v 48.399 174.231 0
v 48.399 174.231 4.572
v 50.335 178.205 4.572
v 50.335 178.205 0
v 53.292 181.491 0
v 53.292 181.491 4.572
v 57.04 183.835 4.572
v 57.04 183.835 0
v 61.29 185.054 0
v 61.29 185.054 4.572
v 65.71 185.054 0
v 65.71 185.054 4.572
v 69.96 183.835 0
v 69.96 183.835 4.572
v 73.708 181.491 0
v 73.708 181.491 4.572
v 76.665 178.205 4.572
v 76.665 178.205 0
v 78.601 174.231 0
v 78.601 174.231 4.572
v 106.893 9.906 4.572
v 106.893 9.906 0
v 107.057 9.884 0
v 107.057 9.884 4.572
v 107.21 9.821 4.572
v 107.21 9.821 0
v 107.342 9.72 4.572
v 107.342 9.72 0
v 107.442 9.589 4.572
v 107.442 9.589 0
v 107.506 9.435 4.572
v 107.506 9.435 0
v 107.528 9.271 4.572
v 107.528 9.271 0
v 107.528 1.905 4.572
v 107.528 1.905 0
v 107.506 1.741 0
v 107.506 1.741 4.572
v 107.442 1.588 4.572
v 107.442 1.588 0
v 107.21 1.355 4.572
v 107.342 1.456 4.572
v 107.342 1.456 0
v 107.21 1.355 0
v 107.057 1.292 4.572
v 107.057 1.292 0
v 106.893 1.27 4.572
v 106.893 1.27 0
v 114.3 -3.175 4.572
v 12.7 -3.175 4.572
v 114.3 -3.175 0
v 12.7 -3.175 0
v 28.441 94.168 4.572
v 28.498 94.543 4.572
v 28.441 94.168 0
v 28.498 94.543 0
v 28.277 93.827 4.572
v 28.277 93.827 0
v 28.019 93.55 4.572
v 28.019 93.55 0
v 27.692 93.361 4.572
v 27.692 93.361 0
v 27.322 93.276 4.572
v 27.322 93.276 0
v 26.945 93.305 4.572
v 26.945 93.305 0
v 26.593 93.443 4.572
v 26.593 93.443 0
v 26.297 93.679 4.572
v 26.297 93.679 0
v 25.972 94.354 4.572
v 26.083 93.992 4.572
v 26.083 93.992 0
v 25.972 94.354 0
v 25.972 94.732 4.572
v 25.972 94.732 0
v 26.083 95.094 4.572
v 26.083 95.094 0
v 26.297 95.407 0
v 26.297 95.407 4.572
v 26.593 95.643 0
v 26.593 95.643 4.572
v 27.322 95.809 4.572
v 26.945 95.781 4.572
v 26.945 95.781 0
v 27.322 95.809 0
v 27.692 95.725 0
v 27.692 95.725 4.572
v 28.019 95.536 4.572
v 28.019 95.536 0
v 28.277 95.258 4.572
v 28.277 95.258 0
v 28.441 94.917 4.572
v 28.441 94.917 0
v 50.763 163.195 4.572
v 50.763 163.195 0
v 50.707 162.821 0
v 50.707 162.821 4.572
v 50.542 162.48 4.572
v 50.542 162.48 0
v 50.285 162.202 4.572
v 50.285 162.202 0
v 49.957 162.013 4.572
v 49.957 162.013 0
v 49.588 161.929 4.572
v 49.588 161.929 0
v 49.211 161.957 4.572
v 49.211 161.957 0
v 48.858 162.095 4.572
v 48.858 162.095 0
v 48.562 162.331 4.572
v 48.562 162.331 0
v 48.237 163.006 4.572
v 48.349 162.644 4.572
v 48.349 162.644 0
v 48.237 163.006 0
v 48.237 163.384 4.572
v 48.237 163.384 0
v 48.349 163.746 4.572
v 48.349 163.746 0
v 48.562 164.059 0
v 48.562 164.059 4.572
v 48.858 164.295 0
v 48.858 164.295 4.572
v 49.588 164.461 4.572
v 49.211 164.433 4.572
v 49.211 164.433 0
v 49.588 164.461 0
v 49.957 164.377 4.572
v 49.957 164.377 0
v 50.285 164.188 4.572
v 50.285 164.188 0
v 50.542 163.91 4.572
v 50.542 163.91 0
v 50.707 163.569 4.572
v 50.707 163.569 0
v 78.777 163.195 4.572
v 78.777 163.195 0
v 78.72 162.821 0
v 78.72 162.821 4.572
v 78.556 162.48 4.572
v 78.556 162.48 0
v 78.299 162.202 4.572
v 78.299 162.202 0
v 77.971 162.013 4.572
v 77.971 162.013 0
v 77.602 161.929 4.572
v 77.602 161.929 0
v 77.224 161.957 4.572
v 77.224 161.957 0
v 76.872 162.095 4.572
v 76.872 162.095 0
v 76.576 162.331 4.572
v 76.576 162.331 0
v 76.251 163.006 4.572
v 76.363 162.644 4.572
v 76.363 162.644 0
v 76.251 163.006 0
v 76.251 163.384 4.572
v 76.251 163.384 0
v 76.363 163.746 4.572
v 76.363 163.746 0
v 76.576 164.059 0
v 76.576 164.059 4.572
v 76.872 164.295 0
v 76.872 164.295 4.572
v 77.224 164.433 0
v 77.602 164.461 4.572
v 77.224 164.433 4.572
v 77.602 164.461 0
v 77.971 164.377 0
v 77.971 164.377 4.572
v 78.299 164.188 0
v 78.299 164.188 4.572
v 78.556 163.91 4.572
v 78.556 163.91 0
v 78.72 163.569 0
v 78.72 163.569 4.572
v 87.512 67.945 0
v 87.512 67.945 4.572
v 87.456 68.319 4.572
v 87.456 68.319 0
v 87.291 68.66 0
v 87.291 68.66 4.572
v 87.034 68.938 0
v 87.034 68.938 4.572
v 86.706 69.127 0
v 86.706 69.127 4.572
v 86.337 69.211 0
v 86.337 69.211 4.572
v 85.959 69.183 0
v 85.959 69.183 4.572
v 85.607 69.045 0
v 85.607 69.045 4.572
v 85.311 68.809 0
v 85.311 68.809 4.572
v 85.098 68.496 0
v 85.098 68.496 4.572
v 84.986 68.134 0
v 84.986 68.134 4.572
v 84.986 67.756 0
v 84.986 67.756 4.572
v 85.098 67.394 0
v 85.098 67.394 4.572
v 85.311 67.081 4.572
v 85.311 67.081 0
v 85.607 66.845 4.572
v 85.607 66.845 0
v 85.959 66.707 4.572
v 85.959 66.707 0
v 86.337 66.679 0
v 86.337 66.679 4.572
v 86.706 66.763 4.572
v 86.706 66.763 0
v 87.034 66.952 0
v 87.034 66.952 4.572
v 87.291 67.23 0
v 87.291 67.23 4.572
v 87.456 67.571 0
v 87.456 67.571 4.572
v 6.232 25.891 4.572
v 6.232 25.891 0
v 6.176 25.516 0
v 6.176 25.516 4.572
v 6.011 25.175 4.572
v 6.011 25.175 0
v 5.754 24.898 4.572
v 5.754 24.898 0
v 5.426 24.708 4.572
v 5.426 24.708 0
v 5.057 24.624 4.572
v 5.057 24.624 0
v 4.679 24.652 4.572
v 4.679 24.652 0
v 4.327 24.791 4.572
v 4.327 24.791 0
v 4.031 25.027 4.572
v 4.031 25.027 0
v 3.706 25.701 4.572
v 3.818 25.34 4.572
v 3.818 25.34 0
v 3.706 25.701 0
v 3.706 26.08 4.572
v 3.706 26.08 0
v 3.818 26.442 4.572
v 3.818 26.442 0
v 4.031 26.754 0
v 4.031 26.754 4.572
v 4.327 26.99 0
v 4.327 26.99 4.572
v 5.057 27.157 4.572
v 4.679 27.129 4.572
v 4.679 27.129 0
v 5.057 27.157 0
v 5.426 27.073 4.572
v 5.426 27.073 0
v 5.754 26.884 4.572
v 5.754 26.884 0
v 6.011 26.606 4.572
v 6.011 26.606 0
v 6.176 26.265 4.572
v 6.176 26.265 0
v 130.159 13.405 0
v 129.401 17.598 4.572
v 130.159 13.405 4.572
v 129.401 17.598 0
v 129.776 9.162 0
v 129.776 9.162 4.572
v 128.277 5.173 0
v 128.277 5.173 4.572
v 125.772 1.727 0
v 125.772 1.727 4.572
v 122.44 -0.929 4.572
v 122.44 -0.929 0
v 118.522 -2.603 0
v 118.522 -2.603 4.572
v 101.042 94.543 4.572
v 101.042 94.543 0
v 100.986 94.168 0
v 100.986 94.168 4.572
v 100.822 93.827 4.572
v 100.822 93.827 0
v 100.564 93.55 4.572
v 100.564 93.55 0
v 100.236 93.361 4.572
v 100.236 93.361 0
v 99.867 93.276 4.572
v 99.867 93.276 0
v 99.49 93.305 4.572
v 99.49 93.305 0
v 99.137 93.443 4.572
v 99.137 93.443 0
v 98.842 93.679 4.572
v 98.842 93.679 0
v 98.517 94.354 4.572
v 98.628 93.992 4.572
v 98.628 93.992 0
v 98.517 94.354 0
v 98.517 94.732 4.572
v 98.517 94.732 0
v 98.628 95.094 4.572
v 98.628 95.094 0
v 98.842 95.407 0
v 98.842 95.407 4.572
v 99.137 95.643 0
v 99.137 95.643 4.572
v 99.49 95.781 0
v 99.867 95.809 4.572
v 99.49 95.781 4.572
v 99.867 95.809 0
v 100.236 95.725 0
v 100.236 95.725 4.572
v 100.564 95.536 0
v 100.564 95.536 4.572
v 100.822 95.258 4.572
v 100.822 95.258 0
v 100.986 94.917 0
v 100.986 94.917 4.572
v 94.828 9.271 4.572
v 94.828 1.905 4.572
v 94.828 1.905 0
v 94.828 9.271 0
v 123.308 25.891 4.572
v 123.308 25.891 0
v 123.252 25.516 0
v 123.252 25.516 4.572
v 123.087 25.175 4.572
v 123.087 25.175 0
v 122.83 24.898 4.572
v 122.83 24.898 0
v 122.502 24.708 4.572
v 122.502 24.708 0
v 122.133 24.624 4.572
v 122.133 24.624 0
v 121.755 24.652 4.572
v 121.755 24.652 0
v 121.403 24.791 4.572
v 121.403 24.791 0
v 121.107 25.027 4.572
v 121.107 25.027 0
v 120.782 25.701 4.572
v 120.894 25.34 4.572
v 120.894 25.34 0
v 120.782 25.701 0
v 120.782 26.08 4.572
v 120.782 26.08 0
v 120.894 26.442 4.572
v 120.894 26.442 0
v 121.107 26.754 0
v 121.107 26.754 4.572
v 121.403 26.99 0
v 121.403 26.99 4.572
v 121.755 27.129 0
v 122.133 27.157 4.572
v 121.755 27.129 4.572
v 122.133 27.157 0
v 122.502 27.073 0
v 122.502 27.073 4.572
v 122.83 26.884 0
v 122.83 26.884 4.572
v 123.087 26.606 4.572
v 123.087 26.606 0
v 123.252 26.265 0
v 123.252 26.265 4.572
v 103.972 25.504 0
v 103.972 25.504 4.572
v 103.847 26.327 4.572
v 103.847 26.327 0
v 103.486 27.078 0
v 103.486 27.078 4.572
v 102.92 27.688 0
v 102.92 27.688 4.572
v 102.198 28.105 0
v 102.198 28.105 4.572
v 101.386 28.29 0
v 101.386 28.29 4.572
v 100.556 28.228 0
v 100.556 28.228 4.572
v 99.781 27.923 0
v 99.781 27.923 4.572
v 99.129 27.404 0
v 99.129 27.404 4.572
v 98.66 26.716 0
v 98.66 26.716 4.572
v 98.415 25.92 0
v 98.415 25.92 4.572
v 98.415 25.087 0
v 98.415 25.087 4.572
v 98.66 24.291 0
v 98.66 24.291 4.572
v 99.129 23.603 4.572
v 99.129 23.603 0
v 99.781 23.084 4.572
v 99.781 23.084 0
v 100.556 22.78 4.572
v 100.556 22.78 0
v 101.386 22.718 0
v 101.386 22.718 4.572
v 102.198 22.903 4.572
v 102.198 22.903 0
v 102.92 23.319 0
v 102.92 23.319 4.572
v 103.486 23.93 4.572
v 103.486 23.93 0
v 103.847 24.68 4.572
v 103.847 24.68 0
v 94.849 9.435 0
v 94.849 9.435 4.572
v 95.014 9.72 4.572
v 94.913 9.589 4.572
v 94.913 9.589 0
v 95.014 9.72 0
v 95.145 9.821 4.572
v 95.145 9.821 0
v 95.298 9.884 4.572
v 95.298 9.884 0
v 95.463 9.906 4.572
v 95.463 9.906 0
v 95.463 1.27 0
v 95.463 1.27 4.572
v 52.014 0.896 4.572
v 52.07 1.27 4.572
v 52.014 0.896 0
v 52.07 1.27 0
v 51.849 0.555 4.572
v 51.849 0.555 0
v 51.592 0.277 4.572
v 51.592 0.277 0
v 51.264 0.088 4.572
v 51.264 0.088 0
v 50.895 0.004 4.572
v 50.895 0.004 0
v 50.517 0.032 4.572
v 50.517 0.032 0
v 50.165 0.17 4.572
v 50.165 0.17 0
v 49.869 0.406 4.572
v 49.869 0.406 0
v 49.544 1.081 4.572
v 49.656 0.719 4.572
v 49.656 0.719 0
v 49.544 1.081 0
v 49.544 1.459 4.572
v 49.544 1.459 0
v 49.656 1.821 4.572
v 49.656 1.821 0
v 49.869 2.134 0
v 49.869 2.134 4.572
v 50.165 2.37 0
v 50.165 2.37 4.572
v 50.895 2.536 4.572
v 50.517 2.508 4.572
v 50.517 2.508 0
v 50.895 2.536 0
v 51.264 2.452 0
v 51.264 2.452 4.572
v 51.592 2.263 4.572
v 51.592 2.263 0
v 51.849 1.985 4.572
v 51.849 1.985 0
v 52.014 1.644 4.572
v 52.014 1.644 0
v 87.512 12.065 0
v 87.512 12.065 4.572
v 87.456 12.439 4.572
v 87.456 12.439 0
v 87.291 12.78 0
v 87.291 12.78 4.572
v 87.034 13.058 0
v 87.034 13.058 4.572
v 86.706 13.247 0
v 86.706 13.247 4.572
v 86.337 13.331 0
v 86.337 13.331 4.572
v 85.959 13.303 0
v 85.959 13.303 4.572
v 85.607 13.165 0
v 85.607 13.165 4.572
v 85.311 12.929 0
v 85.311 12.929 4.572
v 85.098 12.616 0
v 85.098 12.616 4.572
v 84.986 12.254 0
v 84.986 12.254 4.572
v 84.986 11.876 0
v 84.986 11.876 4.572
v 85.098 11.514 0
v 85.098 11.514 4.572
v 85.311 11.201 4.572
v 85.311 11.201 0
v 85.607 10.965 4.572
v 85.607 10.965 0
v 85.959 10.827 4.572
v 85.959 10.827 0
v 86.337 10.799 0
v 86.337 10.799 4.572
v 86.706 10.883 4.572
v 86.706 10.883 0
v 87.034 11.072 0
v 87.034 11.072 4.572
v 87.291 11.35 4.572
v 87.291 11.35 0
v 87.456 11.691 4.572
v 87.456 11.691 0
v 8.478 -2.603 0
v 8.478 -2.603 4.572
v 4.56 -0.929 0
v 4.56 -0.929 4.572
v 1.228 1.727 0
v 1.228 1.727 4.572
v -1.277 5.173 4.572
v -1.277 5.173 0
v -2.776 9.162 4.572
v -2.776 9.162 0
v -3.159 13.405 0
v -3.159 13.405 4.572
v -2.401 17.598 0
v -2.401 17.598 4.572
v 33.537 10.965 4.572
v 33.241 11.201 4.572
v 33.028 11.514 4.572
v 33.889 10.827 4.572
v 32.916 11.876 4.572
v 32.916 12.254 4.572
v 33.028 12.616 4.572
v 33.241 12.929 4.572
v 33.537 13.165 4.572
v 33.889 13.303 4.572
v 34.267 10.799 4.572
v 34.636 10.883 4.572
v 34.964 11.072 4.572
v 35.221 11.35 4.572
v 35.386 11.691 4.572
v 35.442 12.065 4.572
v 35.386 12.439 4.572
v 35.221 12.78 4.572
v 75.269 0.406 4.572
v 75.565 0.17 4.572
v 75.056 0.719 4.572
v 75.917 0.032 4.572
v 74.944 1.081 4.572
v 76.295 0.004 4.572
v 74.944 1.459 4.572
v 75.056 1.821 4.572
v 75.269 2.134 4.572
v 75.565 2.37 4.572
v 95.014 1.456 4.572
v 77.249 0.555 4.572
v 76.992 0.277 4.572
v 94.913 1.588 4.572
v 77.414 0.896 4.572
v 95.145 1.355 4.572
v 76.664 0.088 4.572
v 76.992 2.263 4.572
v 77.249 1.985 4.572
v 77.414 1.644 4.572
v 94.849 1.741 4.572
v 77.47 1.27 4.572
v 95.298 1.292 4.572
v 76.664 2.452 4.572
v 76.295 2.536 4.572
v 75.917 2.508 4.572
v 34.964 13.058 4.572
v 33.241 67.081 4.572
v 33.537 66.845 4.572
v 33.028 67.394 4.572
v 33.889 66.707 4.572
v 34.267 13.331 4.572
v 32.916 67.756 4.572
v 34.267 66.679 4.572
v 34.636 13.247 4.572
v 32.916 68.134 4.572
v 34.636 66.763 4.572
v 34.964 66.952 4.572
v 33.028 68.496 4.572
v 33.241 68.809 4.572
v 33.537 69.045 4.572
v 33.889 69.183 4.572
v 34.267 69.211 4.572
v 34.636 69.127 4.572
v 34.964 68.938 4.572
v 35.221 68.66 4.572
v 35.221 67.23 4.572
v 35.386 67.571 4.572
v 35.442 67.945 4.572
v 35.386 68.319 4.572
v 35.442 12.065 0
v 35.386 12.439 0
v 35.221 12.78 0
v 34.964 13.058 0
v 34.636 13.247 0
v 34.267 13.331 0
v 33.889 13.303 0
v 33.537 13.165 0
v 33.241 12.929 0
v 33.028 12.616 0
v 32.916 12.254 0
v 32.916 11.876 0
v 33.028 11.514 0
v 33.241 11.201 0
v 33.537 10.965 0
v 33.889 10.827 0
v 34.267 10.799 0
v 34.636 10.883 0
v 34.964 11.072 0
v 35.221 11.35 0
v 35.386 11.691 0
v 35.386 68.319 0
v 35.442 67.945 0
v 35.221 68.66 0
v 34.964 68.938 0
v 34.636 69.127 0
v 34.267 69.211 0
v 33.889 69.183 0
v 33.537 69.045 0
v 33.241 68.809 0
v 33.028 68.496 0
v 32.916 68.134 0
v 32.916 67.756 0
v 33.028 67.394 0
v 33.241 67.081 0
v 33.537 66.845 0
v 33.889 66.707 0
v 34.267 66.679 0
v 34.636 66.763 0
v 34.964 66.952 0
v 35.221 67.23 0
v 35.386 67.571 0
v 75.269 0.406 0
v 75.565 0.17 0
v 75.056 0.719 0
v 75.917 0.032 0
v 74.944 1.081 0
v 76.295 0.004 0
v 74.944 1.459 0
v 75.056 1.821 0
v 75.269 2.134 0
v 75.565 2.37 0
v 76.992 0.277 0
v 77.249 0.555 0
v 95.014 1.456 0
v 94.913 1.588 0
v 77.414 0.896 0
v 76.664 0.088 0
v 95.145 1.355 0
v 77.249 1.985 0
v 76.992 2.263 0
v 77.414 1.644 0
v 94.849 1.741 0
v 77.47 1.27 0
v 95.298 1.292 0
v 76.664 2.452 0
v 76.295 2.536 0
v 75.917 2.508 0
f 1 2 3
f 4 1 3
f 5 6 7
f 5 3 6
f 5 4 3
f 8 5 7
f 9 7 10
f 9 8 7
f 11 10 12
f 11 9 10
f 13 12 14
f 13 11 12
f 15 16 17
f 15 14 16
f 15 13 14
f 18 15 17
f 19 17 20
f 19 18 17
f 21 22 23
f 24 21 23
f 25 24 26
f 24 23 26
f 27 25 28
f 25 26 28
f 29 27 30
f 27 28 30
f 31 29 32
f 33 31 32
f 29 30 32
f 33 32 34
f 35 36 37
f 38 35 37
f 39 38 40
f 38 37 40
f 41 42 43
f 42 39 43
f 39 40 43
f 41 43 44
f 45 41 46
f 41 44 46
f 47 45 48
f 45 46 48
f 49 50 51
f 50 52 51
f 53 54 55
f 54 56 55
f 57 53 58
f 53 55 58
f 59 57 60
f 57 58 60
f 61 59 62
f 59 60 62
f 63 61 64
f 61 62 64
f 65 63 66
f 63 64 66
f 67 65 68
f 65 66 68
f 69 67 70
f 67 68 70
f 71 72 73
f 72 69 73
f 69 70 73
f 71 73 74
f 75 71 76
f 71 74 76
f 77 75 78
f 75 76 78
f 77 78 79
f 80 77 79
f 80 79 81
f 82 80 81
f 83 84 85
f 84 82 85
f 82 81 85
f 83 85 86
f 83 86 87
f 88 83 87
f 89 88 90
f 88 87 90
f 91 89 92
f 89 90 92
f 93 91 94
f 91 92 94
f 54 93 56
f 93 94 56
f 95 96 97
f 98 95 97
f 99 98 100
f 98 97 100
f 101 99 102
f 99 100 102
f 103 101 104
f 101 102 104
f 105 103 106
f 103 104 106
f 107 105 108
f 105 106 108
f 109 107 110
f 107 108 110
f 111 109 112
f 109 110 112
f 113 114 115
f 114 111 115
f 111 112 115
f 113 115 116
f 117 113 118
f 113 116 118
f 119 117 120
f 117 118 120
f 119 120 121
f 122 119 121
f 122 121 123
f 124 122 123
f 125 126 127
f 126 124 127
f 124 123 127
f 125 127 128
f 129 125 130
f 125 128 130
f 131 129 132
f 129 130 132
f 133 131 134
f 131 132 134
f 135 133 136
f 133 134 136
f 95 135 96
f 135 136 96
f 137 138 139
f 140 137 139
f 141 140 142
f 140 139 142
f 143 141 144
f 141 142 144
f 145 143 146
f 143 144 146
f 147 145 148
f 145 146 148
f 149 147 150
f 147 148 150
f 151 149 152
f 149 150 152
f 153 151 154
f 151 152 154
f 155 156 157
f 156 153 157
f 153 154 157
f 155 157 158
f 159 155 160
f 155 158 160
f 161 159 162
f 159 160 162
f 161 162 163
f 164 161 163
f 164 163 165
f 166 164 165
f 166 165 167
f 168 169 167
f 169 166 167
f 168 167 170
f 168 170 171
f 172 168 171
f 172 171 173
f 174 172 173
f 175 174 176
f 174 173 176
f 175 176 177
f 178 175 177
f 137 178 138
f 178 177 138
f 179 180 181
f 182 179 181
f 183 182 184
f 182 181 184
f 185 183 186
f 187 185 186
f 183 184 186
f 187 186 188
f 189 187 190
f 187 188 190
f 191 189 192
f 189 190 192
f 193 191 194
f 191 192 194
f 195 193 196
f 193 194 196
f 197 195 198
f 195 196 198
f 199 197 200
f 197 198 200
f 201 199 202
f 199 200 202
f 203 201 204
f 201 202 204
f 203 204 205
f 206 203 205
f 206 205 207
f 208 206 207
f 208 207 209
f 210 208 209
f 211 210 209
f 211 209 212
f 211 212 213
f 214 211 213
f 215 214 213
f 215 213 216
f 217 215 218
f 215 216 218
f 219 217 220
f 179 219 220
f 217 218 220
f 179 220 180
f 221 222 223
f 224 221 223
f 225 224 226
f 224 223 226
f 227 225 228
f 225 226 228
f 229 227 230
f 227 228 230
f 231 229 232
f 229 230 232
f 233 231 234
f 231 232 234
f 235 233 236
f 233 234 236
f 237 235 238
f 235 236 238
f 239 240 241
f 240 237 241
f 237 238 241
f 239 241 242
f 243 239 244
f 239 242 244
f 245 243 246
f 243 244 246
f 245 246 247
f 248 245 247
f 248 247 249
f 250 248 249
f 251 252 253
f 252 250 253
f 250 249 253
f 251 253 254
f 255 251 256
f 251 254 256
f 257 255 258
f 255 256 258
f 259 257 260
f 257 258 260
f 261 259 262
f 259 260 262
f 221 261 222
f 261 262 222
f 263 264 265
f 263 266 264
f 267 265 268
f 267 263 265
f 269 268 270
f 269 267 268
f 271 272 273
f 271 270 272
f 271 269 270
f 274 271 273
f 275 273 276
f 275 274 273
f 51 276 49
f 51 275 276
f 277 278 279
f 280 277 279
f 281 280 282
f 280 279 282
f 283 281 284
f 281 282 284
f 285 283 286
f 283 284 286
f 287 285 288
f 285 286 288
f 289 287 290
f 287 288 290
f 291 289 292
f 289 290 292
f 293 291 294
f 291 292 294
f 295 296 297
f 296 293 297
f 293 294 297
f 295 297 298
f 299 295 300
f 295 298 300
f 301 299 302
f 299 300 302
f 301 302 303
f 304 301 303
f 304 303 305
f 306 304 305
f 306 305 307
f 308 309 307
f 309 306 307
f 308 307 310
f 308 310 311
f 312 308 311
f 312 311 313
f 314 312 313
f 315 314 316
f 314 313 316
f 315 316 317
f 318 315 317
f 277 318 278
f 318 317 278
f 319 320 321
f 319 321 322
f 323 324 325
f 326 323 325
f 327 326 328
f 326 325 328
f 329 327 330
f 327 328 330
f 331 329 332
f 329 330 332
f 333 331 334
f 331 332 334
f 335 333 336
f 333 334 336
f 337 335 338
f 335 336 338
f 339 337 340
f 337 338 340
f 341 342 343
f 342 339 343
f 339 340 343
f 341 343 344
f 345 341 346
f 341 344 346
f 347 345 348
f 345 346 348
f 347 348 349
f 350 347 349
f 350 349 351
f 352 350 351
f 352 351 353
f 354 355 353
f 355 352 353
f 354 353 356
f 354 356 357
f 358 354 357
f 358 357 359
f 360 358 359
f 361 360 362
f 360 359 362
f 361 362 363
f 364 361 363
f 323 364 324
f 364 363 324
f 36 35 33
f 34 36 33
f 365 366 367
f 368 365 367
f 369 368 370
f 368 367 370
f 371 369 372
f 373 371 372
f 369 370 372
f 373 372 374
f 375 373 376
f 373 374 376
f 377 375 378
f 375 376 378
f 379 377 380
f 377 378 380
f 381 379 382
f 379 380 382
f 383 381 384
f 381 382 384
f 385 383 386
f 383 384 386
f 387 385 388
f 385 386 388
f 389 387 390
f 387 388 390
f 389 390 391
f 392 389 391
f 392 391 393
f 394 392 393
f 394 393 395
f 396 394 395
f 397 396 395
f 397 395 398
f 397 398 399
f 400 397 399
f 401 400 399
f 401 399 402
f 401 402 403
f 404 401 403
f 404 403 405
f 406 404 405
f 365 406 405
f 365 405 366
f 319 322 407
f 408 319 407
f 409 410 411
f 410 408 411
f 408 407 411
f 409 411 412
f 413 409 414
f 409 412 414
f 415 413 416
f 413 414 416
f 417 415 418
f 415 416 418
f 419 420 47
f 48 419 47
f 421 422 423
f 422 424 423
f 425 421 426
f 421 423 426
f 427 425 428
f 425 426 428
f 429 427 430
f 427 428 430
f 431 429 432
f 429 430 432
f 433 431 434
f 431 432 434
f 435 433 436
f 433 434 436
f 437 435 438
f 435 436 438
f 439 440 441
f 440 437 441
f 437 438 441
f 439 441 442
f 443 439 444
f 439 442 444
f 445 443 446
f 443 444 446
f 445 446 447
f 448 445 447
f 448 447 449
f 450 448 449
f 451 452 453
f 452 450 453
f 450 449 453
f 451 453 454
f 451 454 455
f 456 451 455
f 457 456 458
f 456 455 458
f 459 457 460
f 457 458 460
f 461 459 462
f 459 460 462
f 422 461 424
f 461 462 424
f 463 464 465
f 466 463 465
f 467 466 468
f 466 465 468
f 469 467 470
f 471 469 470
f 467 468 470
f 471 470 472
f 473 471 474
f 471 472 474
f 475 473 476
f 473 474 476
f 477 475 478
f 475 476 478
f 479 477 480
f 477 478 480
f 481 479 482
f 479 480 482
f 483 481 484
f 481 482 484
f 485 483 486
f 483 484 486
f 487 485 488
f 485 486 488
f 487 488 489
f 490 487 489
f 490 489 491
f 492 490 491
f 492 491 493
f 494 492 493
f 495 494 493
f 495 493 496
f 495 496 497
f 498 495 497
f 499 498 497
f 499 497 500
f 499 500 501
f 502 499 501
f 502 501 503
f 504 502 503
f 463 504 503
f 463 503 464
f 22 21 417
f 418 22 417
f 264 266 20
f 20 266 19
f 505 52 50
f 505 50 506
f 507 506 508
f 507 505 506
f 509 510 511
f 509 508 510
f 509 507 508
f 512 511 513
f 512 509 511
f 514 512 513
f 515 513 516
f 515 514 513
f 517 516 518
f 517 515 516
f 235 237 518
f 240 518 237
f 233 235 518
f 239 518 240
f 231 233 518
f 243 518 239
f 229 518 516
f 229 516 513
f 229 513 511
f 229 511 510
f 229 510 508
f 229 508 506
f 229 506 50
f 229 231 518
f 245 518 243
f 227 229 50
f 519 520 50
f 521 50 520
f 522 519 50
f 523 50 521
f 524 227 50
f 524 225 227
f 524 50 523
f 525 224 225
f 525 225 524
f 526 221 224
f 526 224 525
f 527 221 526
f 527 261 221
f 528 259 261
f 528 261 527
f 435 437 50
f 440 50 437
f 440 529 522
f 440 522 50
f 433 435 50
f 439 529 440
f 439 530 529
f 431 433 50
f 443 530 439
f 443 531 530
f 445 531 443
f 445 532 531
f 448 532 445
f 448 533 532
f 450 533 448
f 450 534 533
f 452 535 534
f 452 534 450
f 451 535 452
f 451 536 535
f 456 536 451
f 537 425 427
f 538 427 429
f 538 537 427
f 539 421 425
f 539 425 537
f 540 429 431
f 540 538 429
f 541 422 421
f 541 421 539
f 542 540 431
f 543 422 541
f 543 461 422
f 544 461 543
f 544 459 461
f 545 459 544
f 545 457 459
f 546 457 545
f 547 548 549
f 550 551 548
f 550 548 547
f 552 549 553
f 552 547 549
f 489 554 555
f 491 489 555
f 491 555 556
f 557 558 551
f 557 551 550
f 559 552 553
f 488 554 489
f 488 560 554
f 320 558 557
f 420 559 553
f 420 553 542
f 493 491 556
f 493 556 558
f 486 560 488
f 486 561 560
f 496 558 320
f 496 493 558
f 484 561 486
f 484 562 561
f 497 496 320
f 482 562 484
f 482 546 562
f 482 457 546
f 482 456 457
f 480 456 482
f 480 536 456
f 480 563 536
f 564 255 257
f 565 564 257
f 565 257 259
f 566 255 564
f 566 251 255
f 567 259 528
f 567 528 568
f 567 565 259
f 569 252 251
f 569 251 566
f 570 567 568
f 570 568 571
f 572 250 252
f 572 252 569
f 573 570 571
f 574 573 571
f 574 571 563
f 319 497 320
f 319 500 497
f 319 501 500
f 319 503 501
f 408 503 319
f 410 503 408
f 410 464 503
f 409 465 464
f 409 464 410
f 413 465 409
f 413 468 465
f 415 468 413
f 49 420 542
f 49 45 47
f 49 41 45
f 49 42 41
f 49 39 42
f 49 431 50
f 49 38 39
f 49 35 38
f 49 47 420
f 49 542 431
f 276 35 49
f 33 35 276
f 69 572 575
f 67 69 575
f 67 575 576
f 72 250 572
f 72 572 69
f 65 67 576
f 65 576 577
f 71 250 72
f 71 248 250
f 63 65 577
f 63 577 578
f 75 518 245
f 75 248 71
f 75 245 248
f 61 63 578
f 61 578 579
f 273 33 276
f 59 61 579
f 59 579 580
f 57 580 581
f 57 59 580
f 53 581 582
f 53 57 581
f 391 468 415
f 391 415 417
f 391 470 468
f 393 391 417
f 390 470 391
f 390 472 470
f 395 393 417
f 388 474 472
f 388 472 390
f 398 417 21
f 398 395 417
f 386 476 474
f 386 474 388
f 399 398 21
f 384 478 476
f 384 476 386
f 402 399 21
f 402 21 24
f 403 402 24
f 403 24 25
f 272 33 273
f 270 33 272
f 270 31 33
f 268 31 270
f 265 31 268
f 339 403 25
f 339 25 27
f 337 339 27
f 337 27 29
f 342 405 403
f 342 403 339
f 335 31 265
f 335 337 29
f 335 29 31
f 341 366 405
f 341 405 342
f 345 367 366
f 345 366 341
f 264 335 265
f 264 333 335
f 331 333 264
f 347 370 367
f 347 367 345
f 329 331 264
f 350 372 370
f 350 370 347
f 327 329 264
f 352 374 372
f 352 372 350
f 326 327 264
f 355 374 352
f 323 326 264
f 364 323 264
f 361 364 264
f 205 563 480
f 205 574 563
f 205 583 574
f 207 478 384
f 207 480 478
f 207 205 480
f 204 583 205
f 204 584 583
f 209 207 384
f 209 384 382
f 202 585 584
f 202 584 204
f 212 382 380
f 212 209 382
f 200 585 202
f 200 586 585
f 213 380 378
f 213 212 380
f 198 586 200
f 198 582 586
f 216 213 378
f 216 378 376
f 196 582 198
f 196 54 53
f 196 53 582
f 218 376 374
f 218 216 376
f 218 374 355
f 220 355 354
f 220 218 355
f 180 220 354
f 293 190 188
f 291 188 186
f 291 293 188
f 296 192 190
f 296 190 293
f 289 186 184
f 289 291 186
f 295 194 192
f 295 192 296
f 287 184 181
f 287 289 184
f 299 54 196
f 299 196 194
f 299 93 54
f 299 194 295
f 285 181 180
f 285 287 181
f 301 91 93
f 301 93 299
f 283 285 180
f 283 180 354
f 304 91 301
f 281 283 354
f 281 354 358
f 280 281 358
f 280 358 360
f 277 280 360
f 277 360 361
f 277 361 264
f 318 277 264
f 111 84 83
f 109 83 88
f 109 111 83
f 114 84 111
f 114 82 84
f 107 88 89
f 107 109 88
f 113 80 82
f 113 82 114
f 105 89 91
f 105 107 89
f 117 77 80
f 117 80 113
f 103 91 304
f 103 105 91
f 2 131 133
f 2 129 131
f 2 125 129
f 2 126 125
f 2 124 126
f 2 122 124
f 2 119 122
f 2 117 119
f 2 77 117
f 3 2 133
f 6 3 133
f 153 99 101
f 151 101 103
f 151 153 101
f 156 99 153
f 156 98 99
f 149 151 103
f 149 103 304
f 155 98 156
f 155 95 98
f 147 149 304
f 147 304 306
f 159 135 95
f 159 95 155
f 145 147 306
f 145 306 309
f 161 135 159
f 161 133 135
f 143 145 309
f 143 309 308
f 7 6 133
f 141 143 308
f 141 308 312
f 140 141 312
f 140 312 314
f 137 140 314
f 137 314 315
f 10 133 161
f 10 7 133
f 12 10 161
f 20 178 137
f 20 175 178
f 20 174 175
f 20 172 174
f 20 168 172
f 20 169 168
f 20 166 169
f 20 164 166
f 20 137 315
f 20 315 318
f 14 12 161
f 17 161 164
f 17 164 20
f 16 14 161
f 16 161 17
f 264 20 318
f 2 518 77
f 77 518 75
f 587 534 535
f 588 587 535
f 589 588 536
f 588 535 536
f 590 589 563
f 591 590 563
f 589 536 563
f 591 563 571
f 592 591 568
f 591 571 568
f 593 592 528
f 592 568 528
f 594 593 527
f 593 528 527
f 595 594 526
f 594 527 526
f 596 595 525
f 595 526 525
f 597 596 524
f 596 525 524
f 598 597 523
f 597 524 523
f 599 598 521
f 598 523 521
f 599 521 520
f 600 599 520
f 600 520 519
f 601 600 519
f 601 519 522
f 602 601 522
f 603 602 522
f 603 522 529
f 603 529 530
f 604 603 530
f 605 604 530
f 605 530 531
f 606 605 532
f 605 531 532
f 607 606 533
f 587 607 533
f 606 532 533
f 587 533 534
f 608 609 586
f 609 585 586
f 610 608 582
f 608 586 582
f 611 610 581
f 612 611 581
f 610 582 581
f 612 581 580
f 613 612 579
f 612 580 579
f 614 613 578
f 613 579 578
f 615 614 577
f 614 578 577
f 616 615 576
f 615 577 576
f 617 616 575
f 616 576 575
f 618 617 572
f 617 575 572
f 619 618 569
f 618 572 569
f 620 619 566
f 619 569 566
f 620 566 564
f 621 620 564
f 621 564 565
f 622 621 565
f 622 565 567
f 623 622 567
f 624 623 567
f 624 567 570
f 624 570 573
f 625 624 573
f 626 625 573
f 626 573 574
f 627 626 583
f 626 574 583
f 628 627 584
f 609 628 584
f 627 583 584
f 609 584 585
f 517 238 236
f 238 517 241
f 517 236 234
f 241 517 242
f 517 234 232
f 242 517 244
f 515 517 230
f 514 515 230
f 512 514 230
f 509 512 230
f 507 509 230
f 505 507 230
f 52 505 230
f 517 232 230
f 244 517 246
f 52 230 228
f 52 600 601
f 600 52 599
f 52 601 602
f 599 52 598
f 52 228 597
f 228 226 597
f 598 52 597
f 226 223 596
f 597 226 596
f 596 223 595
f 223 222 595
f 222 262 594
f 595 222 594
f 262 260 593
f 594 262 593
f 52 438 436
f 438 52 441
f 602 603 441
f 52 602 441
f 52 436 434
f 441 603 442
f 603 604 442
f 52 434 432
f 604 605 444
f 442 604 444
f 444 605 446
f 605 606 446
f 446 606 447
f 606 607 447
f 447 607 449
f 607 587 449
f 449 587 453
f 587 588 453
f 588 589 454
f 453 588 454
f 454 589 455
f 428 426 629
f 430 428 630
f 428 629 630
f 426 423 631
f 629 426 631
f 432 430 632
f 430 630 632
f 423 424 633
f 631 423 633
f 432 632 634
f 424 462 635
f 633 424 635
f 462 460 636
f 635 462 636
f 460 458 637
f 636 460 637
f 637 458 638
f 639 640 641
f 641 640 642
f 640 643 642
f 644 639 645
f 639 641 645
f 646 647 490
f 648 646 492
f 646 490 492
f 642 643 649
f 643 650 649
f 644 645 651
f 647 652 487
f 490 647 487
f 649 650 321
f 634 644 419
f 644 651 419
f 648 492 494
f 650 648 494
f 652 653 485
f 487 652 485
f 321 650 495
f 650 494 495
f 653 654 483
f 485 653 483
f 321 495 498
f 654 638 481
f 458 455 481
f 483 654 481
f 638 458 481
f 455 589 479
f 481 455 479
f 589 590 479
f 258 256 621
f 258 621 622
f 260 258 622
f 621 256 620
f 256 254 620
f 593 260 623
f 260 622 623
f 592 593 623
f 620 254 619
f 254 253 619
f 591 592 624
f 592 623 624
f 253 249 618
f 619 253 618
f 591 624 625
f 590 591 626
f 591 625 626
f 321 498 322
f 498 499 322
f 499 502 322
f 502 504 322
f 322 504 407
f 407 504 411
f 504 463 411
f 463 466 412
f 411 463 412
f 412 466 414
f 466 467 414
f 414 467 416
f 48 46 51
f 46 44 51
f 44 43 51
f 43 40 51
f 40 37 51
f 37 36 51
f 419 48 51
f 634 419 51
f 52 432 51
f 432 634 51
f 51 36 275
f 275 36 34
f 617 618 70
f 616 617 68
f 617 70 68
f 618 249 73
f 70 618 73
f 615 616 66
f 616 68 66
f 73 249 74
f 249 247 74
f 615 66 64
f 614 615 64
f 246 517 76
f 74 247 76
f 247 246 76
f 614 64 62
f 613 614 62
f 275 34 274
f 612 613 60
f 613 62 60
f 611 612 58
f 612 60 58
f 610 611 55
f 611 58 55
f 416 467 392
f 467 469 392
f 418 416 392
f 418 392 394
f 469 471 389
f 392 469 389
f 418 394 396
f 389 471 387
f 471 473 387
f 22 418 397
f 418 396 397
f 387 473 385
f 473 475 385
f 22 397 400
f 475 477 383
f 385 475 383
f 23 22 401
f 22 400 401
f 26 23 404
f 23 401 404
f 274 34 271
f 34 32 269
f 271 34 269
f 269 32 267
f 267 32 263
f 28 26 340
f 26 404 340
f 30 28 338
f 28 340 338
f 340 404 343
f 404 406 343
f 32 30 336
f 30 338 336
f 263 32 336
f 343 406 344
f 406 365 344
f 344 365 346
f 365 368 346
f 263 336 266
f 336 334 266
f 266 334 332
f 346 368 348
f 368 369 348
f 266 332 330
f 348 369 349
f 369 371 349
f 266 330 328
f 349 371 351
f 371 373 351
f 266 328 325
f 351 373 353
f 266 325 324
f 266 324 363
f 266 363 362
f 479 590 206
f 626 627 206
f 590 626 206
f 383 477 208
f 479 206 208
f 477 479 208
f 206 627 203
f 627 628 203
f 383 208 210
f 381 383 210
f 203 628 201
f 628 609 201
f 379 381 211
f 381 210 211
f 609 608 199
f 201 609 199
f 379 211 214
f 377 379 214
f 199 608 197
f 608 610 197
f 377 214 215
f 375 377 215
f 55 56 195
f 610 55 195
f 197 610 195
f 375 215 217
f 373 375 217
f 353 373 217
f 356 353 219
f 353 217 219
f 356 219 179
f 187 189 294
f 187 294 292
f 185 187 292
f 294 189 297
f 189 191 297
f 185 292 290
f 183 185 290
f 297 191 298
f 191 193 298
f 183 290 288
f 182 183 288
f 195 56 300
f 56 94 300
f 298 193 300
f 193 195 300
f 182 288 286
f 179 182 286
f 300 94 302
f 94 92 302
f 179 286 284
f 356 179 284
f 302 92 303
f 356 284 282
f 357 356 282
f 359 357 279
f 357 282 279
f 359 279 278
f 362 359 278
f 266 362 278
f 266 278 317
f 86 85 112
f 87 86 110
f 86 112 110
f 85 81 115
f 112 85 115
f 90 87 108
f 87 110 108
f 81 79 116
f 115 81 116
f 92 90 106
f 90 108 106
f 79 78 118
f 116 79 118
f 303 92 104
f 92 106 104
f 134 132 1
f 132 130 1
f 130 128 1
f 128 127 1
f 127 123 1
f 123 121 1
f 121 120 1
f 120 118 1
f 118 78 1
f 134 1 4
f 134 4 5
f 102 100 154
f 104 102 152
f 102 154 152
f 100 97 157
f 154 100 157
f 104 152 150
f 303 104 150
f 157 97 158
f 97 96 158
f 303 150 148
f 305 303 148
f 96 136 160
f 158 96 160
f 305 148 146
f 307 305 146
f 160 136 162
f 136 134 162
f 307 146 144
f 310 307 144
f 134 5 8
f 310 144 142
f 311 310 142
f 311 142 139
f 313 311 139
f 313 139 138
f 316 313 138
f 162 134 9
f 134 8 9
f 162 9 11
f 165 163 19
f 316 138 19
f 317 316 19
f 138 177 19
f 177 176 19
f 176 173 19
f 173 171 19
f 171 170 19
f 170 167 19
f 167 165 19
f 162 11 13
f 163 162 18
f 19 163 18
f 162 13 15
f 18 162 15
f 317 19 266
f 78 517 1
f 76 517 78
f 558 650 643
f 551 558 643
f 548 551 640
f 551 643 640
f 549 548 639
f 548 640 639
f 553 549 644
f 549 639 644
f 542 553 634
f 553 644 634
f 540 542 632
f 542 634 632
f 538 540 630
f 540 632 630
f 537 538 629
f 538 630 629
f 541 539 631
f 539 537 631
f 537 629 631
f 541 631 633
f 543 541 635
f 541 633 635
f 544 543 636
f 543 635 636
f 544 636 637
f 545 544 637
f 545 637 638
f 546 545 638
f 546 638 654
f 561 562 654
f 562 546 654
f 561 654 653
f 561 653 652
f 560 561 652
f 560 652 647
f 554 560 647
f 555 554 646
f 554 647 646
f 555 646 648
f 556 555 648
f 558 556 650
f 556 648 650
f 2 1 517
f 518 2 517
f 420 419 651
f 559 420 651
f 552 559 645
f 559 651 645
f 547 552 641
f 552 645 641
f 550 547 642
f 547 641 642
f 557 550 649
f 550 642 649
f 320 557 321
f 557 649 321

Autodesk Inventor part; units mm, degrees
ref_plane "YZ Plane" through (0, 0, 0) normal (1, 0, 0) x (0, 1, 0)
ref_plane "XZ Plane" through (0, 0, 0) normal (0, 1, 0) x (-1, 0, 0)
sketch "Sketch1" plane through (0, 0, 0) normal (0, 0, 1) x (1, 0, 0)
  arc A0 (-2.400661, 17.597517) -> (12.7, -3.175) centre (12.7, 12.7) ccw
  arc A1 (114.3, -3.175) -> (129.400661, 17.597517) centre (114.3, 12.7) ccw
  line L0 (114.3, -3.175) -> (12.7, -3.175)
  line L1 (48.399339, 174.230681) -> (-2.400661, 17.597517)
  line L2 (129.400661, 17.597517) -> (78.600661, 174.230681)
  arc A2 (78.600661, 174.230681) -> (48.399339, 174.230681) centre (63.5, 169.333164) ccw
  arc A3 (75.580529, 173.251177) -> (51.419471, 173.251177) centre (63.5, 169.333164) ccw
  arc A4 (0.619471, 16.618013) -> (12.7, 0) centre (12.7, 12.7) ccw
  arc A5 (114.3, 0) -> (126.380529, 16.618013) centre (114.3, 12.7) ccw
  line L3 (12.7, 0) -> (114.3, 0)
  line L4 (0.619471, 16.618013) -> (51.419471, 173.251177)
  line L5 (75.580529, 173.251177) -> (126.380529, 16.618013)
  line L6 (0.619471, 16.618013) -> (3.753882, 26.282436)
  line L7 (3.753882, 26.282436) -> (4.961935, 25.890635)
  circle A6 centre (4.961935, 25.890635) radius 1.27
  line L8 (51.419471, 173.251177) -> (48.285061, 163.586755)
  line L9 (48.285061, 163.586755) -> (49.493113, 163.194953)
  circle A7 centre (49.493113, 163.194953) radius 1.27
  circle A8 centre (27.227524, 94.542794) radius 1.27
  line L10 (75.580529, 173.251177) -> (78.714939, 163.586755)
  line L11 (78.714939, 163.586755) -> (77.506886, 163.194953)
  circle A9 centre (77.506886, 163.194953) radius 1.27
  line L12 (126.380529, 16.618013) -> (123.246118, 26.282436)
  line L13 (123.246118, 26.282436) -> (122.038065, 25.890635)
  circle A10 centre (122.038065, 25.890635) radius 1.27
  circle A11 centre (99.772476, 94.542794) radius 1.27
  line L14 (63.5, 0) -> (63.5, 1.27) construction
  line L15 (63.5, 1.27) -> (76.2, 1.27) construction
  line L16 (63.5, 1.27) -> (50.8, 1.27) construction
  circle A12 centre (50.8, 1.27) radius 1.27
  circle A13 centre (76.2, 1.27) radius 1.27
  point P0 (0, 0)
  point P1 (0, 0)
  dimension "d50" = 2.54
  dimension "d53" = 2.54
  dimension "d39" = 31.75
  dimension "d40" = 31.75
  dimension "d41" = 25.4
  dimension "d42" = 25.4
  dimension "d43" = 25.4
  dimension "d44" = 10.16
  dimension "d45" = 10.16
  dimension "d46" = 1.27
  dimension "d47" = 1.27
  dimension "d48" = 10.16
  dimension "d49" = 10.16
  dimension "d51" = 2.54
  dimension "d52" = 2.54
  dimension "d91" = 12.7
  dimension "d92" = 12.7
ref_plane "Work Plane1" through (0, 0, 4.572) normal (0, 0, 1) x (1, 0, 0)
sketch "Sketch2" plane through (0, 0, 4.572) normal (0, 0, 1) x (1, 0, 0)
  line L0 (12.7, -3.175) -> (114.3, -3.175)
  line L1 (34.171935, 12.065) -> (34.171935, 67.945) construction
  line L2 (34.171935, 67.945) -> (86.241935, 67.945) construction
  line L3 (86.241935, 67.945) -> (86.241935, 12.065) construction
  line L4 (86.241935, 12.065) -> (34.171935, 12.065) construction
  line L5 (34.171935, 12.065) -> (86.241935, 67.945) construction
  line L6 (34.171935, 67.945) -> (86.241935, 12.065) construction
  circle A0 centre (34.171935, 67.945) radius 1.27
  circle A1 centre (34.171935, 12.065) radius 1.27
  circle A2 centre (86.241935, 12.065) radius 1.27
  circle A3 centre (86.241935, 67.945) radius 1.27
  circle A4 centre (4.961935, 25.890635) radius 1.27
  arc A5 (78.600661, 174.230681) -> (48.399339, 174.230681) centre (63.5, 169.333164) ccw
  point P0 (0, 0)
  point P1 (60.206935, 40.005)
  dimension "d71" = 55.88
  dimension "d73" = 52.07
  dimension "d74" = 2.54
  dimension "d75" = 2.54
  dimension "d76" = 2.54
  dimension "d77" = 2.54
  dimension "d80" = 52.07
  dimension "d81" = 15.24
  dimension "d82" = 29.21
sketch "Sketch1 outline for Extrusion8" plane through (0, 0, 0) normal (0, 0, 1) x (1, 0, 0)
  arc A0 (78.600661, 174.230681) -> (48.399339, 174.230681) centre (63.5, 169.333164) ccw
  line L0 (129.400661, 17.597517) -> (78.600661, 174.230681)
  line L1 (48.399339, 174.230681) -> (-2.400661, 17.597517)
  arc A1 (114.3, -3.175) -> (129.400661, 17.597517) centre (114.3, 12.7) ccw
  arc A2 (-2.400661, 17.597517) -> (12.7, -3.175) centre (12.7, 12.7) ccw
  line L2 (12.7, -3.175) -> (114.3, -3.175)
  circle A3 centre (4.961935, 25.890635) radius 1.27
  circle A4 centre (50.8, 1.27) radius 1.27
  circle A5 centre (76.2, 1.27) radius 1.27
  circle A6 centre (122.038065, 25.890635) radius 1.27
  circle A7 centre (27.227524, 94.542794) radius 1.27
  circle A8 centre (49.493113, 163.194953) radius 1.27
  circle A9 centre (99.772476, 94.542794) radius 1.27
  circle A10 centre (77.506886, 163.194953) radius 1.27
extrude "Extrusion8" add sketch "Sketch1 outline for Extrusion8" along normal blind 4.572
sketch "Sketch3" plane through (0, 0, 4.572) normal (0, 0, 1) x (1, 0, 0)
  circle A0 centre (76.2, 1.27) radius 1.27
  line L0 (76.2, 1.27) -> (117.405446, 1.27)
  line L1 (117.405446, 1.27) -> (117.405446, 3.556)
  line L2 (76.2, 3.556) -> (76.2, 1.27)
  line L3 (107.52753, 3.556) -> (107.52753, 9.906)
  line L4 (107.52753, 9.906) -> (94.82753, 9.906)
  line L5 (94.82753, 9.906) -> (94.82753, 3.556)
  circle A1 centre (101.17753, 25.503714) radius 2.794
  line L6 (12.7, -3.175) -> (114.3, -3.175)
  line L7 (63.5, -3.175) -> (63.5, 31.793571) construction
  line L8 (101.17753, 8.001) -> (63.5, 8.001) construction
  line L9 (107.52753, 3.556) -> (107.52753, 1.27)
  line L10 (107.52753, 1.27) -> (94.82753, 1.27)
  line L11 (94.82753, 1.27) -> (94.82753, 3.556)
  line L12 (117.405446, 3.556) -> (107.52753, 3.556)
  line L13 (94.82753, 3.556) -> (76.2, 3.556)
  point P0 (0, 0)
  dimension "d97" = 2.286
  dimension "d98" = 12.7
  dimension "d99" = 6.35
  dimension "d106" = 5.588
  dimension "d109" = 37.67753
extrude "Extrusion10" cut sketch "Sketch3" against normal blind 25.4 contours L11 L5 L4 L3 L9 L0 | A1
fillet "Fillet1" radius 0.635 1 edges at (94.8275, 9.906, 2.286)
fillet "Fillet2" radius 0.635 1 edges at (107.5275, 9.906, 2.286)
extrude "Extrusion11" cut sketch "Sketch2" against normal blind 25.4 contours A0 | A1 | A2 | A3
fillet "Fillet5" radius 0.635 1 edges at (94.8275, 1.27, 2.286)
fillet "Fillet6" radius 0.635 1 edges at (107.5275, 1.27, 2.286)
properties part number "Nathan_LED_Speaker_Back"
